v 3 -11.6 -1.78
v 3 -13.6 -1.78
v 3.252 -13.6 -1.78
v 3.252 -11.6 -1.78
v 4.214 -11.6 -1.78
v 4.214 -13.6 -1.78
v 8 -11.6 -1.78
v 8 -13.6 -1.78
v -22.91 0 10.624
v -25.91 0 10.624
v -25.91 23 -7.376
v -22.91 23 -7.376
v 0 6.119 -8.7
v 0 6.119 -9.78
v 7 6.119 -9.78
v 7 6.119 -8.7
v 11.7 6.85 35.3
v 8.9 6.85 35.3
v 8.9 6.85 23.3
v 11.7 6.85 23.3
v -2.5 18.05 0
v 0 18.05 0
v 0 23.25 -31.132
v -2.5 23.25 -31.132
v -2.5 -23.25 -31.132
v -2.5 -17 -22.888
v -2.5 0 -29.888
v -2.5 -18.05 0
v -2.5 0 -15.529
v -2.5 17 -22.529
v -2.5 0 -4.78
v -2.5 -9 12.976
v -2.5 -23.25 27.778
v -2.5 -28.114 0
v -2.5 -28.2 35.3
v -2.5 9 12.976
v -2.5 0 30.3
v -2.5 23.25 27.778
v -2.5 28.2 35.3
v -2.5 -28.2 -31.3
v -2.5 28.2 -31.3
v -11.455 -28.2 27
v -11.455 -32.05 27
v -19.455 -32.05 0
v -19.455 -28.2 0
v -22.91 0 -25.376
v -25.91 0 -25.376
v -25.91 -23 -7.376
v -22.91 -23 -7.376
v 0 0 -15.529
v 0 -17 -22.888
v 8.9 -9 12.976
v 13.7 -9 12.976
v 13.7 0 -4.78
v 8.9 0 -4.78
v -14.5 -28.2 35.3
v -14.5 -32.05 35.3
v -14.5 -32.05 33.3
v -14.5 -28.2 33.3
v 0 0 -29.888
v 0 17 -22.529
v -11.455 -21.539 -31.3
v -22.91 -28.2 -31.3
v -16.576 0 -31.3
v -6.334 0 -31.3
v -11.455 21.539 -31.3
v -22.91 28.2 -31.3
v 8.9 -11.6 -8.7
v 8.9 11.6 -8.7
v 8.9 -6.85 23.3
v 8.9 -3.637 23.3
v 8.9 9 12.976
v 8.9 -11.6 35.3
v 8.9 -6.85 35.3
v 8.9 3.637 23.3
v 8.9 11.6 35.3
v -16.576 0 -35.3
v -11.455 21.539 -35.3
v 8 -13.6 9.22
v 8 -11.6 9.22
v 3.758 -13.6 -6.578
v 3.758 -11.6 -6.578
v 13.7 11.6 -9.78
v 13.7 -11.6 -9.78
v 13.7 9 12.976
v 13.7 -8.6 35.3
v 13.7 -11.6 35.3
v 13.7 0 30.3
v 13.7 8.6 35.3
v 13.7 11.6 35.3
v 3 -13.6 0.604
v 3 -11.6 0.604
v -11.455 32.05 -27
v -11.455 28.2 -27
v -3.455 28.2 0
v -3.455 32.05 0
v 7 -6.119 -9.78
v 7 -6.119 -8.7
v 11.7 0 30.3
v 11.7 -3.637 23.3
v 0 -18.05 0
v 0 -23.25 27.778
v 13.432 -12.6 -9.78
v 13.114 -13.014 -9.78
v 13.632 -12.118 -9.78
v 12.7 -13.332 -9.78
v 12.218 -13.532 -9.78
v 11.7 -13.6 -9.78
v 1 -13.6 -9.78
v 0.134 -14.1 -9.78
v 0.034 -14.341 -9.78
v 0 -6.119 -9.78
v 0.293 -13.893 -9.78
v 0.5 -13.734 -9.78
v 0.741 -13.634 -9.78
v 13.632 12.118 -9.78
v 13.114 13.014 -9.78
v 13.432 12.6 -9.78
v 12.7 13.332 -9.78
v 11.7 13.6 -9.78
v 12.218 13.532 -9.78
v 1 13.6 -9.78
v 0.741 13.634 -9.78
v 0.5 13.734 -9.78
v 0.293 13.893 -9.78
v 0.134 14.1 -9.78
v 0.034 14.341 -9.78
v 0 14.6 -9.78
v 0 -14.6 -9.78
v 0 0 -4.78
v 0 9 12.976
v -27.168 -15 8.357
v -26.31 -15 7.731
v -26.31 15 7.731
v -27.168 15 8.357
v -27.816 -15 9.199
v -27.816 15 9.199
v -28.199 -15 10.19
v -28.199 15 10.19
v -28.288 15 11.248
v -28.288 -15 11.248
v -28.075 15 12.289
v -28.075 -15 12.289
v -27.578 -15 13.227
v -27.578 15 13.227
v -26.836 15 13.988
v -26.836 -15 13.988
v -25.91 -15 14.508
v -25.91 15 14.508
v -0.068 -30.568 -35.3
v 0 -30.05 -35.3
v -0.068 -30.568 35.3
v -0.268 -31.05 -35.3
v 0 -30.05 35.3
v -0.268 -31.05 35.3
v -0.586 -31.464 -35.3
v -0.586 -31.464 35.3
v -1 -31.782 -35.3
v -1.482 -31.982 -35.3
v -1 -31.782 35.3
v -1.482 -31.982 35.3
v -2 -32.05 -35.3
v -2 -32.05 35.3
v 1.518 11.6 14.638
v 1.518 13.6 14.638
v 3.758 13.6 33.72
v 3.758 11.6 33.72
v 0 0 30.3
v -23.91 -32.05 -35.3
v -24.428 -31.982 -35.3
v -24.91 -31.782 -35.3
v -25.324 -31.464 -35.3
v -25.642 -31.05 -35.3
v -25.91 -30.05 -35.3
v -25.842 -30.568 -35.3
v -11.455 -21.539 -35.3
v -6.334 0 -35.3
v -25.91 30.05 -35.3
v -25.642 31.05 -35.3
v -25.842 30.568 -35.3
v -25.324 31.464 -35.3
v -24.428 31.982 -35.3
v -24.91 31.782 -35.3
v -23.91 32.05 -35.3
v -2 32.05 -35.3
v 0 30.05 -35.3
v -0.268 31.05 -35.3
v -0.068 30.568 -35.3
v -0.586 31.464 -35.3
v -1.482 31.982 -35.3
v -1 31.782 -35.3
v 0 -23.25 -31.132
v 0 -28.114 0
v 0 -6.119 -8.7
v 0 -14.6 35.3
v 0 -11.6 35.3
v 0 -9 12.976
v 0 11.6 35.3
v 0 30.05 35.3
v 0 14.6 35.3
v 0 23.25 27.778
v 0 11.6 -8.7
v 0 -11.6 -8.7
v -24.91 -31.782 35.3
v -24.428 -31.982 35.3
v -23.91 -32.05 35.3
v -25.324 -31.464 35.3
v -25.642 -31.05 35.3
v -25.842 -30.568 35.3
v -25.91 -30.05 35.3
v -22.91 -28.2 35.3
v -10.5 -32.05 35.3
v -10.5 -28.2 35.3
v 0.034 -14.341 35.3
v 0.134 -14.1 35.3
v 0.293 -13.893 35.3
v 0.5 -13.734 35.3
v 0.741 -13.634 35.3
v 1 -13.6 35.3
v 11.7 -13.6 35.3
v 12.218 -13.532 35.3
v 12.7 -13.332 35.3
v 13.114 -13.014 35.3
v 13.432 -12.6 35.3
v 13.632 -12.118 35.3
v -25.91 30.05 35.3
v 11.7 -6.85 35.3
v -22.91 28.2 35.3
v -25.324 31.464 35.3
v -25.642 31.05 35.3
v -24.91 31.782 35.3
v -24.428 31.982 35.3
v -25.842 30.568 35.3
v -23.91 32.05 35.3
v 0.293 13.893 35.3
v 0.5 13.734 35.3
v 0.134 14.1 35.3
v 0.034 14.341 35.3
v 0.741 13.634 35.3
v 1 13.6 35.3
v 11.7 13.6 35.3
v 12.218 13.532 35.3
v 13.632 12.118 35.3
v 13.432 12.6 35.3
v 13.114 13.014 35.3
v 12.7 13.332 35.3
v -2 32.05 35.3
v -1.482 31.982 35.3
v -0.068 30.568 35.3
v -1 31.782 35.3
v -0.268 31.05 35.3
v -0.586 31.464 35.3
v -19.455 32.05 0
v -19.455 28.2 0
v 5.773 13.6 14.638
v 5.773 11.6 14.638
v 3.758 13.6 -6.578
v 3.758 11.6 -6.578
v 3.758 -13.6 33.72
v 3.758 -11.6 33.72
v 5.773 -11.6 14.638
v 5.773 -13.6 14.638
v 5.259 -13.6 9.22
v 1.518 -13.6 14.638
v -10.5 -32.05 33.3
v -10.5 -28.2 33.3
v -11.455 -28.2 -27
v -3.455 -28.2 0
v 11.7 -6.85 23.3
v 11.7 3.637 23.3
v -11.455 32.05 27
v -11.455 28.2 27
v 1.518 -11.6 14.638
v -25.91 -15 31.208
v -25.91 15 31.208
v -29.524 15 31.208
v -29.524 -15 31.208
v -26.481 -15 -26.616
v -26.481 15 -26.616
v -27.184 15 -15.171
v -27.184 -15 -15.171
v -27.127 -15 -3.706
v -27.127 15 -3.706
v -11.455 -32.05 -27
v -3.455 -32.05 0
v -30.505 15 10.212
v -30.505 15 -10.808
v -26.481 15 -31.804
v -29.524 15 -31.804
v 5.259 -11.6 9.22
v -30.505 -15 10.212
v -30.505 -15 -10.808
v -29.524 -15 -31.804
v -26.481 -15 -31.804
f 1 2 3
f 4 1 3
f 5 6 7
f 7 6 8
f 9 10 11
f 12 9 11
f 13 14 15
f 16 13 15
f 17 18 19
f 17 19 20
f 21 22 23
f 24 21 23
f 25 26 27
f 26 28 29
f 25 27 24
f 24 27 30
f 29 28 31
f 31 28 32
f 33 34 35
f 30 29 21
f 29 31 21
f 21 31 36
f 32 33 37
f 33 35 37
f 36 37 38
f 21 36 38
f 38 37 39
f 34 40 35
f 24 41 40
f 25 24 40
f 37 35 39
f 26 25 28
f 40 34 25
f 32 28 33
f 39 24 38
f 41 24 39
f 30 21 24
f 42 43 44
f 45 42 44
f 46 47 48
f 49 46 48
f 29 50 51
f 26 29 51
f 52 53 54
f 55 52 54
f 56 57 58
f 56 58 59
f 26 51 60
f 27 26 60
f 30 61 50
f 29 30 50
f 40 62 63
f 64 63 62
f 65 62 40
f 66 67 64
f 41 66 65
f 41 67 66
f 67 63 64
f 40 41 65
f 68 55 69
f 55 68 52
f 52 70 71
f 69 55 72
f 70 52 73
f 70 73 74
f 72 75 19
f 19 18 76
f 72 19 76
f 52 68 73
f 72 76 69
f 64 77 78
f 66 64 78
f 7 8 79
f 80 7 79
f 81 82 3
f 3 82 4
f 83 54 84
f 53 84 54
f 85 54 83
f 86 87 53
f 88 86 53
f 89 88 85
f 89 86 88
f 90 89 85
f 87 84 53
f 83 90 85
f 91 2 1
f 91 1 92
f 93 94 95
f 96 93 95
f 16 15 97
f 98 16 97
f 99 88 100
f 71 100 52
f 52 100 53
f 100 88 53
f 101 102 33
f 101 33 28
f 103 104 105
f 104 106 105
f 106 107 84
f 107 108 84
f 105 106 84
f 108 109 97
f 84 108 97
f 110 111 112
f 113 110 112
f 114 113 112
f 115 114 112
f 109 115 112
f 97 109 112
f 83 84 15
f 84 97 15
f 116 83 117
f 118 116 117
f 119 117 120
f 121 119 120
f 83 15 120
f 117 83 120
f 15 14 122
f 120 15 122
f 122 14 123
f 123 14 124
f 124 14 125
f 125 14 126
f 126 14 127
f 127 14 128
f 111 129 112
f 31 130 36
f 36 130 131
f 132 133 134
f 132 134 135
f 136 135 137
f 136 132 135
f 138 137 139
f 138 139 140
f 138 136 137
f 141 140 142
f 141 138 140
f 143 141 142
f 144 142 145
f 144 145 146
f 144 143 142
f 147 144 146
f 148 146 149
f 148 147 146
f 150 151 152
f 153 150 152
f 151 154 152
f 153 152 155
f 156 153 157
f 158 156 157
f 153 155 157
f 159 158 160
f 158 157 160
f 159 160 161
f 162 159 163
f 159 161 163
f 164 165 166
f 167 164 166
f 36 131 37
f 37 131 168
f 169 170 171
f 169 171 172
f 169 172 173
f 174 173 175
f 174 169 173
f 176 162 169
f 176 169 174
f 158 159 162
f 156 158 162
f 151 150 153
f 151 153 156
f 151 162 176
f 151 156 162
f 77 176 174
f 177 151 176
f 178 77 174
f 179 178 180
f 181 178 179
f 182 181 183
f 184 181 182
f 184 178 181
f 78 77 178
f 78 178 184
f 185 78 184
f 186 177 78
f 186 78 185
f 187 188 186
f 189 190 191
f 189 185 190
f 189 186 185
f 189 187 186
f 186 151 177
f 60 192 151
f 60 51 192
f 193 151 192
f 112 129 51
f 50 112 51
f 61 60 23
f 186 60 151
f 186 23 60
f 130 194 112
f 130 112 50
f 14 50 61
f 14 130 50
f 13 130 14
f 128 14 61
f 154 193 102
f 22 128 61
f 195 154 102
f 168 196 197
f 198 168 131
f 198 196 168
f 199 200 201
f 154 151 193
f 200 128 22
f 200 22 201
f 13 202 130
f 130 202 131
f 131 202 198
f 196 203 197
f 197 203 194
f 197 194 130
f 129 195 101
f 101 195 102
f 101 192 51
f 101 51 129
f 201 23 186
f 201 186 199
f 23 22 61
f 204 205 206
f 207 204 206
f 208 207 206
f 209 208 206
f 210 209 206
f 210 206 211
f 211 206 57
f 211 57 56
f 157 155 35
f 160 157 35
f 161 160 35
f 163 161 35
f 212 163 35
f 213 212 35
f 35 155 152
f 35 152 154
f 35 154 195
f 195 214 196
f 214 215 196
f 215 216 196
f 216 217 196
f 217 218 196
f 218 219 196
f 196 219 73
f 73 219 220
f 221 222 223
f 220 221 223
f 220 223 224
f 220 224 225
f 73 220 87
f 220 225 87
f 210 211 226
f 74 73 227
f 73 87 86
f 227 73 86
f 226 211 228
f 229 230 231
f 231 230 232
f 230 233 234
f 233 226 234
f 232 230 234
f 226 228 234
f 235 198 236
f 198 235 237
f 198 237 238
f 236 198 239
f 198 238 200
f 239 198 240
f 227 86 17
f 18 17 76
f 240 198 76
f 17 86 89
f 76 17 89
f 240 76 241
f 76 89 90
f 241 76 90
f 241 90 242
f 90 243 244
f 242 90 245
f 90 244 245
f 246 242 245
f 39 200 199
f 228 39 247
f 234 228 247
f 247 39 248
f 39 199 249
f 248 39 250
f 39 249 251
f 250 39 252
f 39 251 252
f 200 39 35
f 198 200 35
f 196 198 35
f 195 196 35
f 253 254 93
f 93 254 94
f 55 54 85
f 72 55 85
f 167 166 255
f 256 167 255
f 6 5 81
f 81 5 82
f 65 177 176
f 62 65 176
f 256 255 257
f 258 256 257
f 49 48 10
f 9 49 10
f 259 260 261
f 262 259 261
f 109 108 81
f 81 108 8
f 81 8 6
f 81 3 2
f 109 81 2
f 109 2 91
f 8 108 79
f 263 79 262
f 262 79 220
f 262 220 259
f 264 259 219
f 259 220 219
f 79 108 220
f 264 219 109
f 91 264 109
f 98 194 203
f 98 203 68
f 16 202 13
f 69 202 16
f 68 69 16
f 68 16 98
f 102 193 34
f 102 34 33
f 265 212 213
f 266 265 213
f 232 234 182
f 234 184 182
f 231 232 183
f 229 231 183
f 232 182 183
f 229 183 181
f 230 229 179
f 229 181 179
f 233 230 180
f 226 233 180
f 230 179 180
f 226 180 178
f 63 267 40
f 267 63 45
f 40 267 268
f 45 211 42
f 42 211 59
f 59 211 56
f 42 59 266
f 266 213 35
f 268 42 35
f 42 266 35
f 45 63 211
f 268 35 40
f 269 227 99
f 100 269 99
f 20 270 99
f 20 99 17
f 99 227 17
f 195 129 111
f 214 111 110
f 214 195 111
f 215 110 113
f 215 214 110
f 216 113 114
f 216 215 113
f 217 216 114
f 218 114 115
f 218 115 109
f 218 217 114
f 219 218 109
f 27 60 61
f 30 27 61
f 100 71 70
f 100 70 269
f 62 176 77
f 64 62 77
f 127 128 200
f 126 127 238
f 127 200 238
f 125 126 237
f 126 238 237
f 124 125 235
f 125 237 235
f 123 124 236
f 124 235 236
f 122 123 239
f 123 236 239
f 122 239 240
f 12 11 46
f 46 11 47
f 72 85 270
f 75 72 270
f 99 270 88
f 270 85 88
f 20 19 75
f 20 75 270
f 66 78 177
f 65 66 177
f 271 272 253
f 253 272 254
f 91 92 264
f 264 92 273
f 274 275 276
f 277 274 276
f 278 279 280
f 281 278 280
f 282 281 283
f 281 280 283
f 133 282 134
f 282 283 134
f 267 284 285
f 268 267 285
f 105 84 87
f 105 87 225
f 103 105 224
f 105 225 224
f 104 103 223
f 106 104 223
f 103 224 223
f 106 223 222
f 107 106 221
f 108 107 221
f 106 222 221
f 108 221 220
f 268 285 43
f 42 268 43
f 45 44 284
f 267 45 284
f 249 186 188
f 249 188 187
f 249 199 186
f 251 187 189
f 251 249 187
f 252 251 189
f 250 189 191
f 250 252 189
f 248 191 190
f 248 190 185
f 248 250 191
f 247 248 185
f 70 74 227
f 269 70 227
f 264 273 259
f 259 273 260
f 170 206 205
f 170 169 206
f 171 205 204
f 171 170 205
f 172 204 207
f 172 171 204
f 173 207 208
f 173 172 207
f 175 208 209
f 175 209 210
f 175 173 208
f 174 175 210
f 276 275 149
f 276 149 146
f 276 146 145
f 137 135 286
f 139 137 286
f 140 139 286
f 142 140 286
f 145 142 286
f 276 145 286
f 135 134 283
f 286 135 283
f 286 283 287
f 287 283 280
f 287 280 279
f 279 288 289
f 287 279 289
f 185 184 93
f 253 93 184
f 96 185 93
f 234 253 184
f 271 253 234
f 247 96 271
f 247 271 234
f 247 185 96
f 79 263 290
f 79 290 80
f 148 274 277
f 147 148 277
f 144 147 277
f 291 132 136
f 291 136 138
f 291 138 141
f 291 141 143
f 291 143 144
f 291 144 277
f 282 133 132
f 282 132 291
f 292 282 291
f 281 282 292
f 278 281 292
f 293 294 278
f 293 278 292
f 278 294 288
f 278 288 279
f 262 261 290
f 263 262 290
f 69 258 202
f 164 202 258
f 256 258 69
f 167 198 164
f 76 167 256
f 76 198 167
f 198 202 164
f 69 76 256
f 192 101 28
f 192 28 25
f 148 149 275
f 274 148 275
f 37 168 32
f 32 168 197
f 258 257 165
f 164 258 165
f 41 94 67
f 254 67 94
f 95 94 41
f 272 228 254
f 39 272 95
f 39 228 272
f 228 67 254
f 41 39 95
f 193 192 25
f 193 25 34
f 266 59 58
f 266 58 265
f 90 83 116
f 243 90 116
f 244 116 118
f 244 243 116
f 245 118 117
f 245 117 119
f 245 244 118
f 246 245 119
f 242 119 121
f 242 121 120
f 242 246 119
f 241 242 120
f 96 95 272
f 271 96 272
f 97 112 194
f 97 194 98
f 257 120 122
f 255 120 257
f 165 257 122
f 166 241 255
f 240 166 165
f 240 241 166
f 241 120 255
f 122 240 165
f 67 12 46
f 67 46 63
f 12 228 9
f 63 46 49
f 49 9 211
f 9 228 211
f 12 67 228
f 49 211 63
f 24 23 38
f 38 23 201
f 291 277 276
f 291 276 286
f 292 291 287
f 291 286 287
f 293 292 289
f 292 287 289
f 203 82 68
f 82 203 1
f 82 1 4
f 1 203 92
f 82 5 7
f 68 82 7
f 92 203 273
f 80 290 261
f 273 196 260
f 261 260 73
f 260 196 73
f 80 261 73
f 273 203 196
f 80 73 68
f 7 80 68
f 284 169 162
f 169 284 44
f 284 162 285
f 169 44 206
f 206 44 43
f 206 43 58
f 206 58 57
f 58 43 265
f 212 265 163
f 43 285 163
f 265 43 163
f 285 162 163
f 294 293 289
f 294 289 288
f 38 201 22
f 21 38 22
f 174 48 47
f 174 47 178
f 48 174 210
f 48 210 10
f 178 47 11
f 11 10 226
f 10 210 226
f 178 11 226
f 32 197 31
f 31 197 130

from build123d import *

# Parameters (mm, degrees)
SKETCH2_W                 = 64.1
SKETCH2_H                 = 70.6
BOSS_EXTRUDE1_DEPTH       = 22.91
SKETCH4_W                 = 21.2
SKETCH4_H                 = 56.4
CUT_EXTRUDE2_DEPTH        = 66.6
SKETCH5_W                 = 27.2
SKETCH5_H                 = 37
BOSS_EXTRUDE2_DEPTH       = 11.7
SKETCH7_W                 = 11.7
SKETCH7_H                 = 27.2
BOSS_EXTRUDE3_DEPTH       = 8.08
SKETCH6_W                 = 8.9
SKETCH6_H                 = 23.2
CUT_EXTRUDE3_DEPTH        = 44
SKETCH8_W                 = 12.2
SKETCH8_H                 = 13.7
CUT_EXTRUDE4_DEPTH        = 12
CUT_EXTRUDE5_REACH        = 64.088
SKETCH10_W                = 27.2
SKETCH10_H                = 45.08
BOSS_EXTRUDE4_DEPTH       = 2
SKETCH11_W                = 5
SKETCH11_H                = 11
CUT_EXTRUDE6_DEPTH        = 2
BOSS_EXTRUDE5_DEPTH       = 27.2
CUT_EXTRUDE8_REACH        = 84.64
SKETCH14_W                = 14.896508991
SKETCH14_H                = 5
SKETCH15_R                = 3.5
CUT_EXTRUDE9_DEPTH        = 5
THREAD2_PITCH             = 1.5
THREAD2_HEIGHT            = 10
THREAD2_RADIUS            = 3.5
THREAD2_START_ANGLE       = -180
CUT_EXTRUDE13_REACH       = 80.566
CUT_EXTRUDE14_REACH       = 62.113
SKETCH41_W                = 7
SKETCH41_H                = 12.238058432
CUT_EXTRUDE15_DEPTH       = 1.08
CUT_EXTRUDE16_DEPTH       = 4
SKETCH44_W                = 4
SKETCH44_H                = 3.85
CUT_EXTRUDE17_DEPTH       = 2
FILLET1_R                 = 2
SKETCH45_W                = 37.09673571
SKETCH45_H                = 46.917342367
CUT_EXTRUDE18_DEPTH       = 17.2
SKETCH46_W                = 64.1
SKETCH46_H                = 70.6
BOSS_EXTRUDE6_DEPTH       = 5
SKETCH48_W                = 70.6
SKETCH48_H                = 64.1
BOSS_EXTRUDE7_DEPTH       = 5
CUT_EXTRUDE19_DEPTH       = 3.5
CUT_EXTRUDE19_DEPTH_BACK  = 4
CHAMFER1_SIZE             = 0.2
SKETCH53_W                = 8.871125199
SKETCH53_H                = 9.434371244
BOSS_EXTRUDE8_DEPTH       = 10
SKETCH54_W                = 7
SKETCH54_H                = 64.1
CUT_EXTRUDE20_DEPTH       = 70.6
FILLET2_R                 = 2
FILLET3_R                 = 1
BOSS_EXTRUDE10_DEPTH      = 15
BOSS_EXTRUDE10_DEPTH_BACK = 15
CUT_EXTRUDE21_DEPTH       = 30
CUT_EXTRUDE22_DEPTH       = 3
CUT_EXTRUDE23_DEPTH       = 2.5
CUT_EXTRUDE24_DEPTH       = 2.5
CUT_EXTRUDE25_DEPTH       = 30


with BuildPart() as part:
    # Sketch2 → Boss-Extrude1 (new body)
    with BuildSketch(Plane.YZ):
        Rectangle(SKETCH2_W, SKETCH2_H)
    extrude(amount=-BOSS_EXTRUDE1_DEPTH)

    # Sketch4 → Cut-Extrude2 (cut)
    with BuildSketch(Plane.XY.offset(35.3)):
        with Locations((-13.1, 0)):
            Rectangle(SKETCH4_W, SKETCH4_H)
    extrude(amount=-CUT_EXTRUDE2_DEPTH, mode=Mode.SUBTRACT)

    # Sketch5 → Boss-Extrude2 (add)
    with BuildSketch(Plane.YZ):
        with Locations((0, 16.8)):
            Rectangle(SKETCH5_W, SKETCH5_H)
    extrude(amount=BOSS_EXTRUDE2_DEPTH)

    # Sketch7 → Boss-Extrude3 (add)
    with BuildSketch(Plane(origin=(0, 0, -1.7), x_dir=(1, 0, 0), z_dir=(0, 0, -1))):
        with Locations((5.85, 0)):
            Rectangle(SKETCH7_W, SKETCH7_H)
    extrude(amount=BOSS_EXTRUDE3_DEPTH)

    # Sketch6 → Cut-Extrude3 (cut)
    with BuildSketch(Plane.XY.offset(35.3)):
        with Locations((4.45, 0)):
            Rectangle(SKETCH6_W, SKETCH6_H)
    extrude(amount=-CUT_EXTRUDE3_DEPTH, mode=Mode.SUBTRACT)

    # Sketch8 → Cut-Extrude4 (cut)
    with BuildSketch(Plane.XY.offset(35.3)):
        with Locations((6.1, 0)):
            Rectangle(SKETCH8_W, SKETCH8_H)
    extrude(amount=-CUT_EXTRUDE4_DEPTH, mode=Mode.SUBTRACT)

    # Cut-Extrude5: up to this face of the body (flat: up to its plane)
    cut_extrude5_end = Plane(part.part.faces().sort_by_distance((5.85, -13.6, 12.76))[0])
    # Sketch9 → Cut-Extrude5 (cut, up to the picked face)
    with BuildSketch(Plane(origin=(0, 13.6, 0), x_dir=(-1, 0, 0), z_dir=(0, 1, 0)), mode=Mode.PRIVATE) as cut_extrude5_sk1:
        Polygon((-3.758381781, 33.720026795), (-5.773286722, 14.637691772), (-3.758381781, -6.578072011), (-1.518207966, 14.637691772), align=None)
    cut_extrude5_tool1 = split(extrude(cut_extrude5_sk1.sketch, amount=-CUT_EXTRUDE5_REACH, mode=Mode.PRIVATE), bisect_by=cut_extrude5_end, keep=Keep.BOTH, mode=Mode.PRIVATE)
    add(cut_extrude5_tool1.solids().sort_by(Axis((3.683292, 13.6, 13.926549), (0, -1, 0)))[0], mode=Mode.SUBTRACT)

    # Sketch10 → Boss-Extrude4 (add)
    with BuildSketch(Plane.YZ.offset(11.7)):
        with Locations((0, 12.76)):
            Rectangle(SKETCH10_W, SKETCH10_H)
    extrude(amount=BOSS_EXTRUDE4_DEPTH)

    # Sketch11 → Cut-Extrude6 (cut)
    with BuildSketch(Plane.XZ.offset(13.6)):
        with Locations((5.5, 3.72)):
            Rectangle(SKETCH11_W, SKETCH11_H)
    extrude(amount=-CUT_EXTRUDE6_DEPTH, mode=Mode.SUBTRACT)

    # Sketch12 → Boss-Extrude5 (add)
    with BuildSketch(Plane.XZ.offset(13.6)):
        Polygon((13.7, 35.3), (28.596508991, 35.3), (28.596508991, -0.612717465), (23.596508991, -0.612717465), (23.596508991, 26.766284959), (17.316508991, 26.766284959), (13.7, 26.766284959), align=None)
    extrude(amount=-BOSS_EXTRUDE5_DEPTH)

    # Cut-Extrude8: up to this face of the body (flat: up to its plane)
    cut_extrude8_end = Plane(part.part.faces().sort_by_distance((26.096508991, 0, -0.612717465))[0])
    # Sketch14 → Cut-Extrude8 (cut, up to the picked face)
    with BuildSketch(Plane.XY.offset(35.3), mode=Mode.PRIVATE) as cut_extrude8_sk1:
        with Locations((21.148254496, -11.1)):
            Rectangle(SKETCH14_W, SKETCH14_H)
    cut_extrude8_tool1 = split(extrude(cut_extrude8_sk1.sketch, amount=-CUT_EXTRUDE8_REACH, mode=Mode.PRIVATE), bisect_by=cut_extrude8_end, keep=Keep.BOTH, mode=Mode.PRIVATE)
    # Sketch14 → Cut-Extrude8 (cut, up to the picked face)
    with BuildSketch(Plane.XY.offset(35.3), mode=Mode.PRIVATE) as cut_extrude8_sk2:
        with Locations((21.148254496, 11.1)):
            Rectangle(SKETCH14_W, SKETCH14_H)
    cut_extrude8_tool2 = split(extrude(cut_extrude8_sk2.sketch, amount=-CUT_EXTRUDE8_REACH, mode=Mode.PRIVATE), bisect_by=cut_extrude8_end, keep=Keep.BOTH, mode=Mode.PRIVATE)
    add(cut_extrude8_tool1.solids().sort_by(Axis((21.148254, -11.1, 35.3), (0, 0, -1)))[0], mode=Mode.SUBTRACT)
    add(cut_extrude8_tool2.solids().sort_by(Axis((21.148254, 11.1, 35.3), (0, 0, -1)))[0], mode=Mode.SUBTRACT)

    # Sketch15 → Cut-Extrude9 (cut)
    with BuildSketch(Plane.YZ.offset(28.596508991)):
        with Locations(Location((0, 18.430454013, 0), (0, 0, 270))):
            Circle(SKETCH15_R)
    extrude(amount=-CUT_EXTRUDE9_DEPTH, mode=Mode.SUBTRACT)

    # Thread2: sweep along a helix
    with BuildLine() as thread2_path:
        add(Helix(THREAD2_PITCH, THREAD2_HEIGHT, THREAD2_RADIUS, center=(29.596508991, 0, 18.430454013), direction=(-1, 0, 0), lefthand=True, mode=Mode.PRIVATE).rotate(Axis((29.596508991, 0, 18.430454013), (-1, 0, 0)), THREAD2_START_ANGLE))
    # Thread Profile3 → Thread2 (sweep, cut)
    with BuildSketch(Plane(origin=(29.596508991, 0, 21.930454013), x_dir=(0, 0, 1), z_dir=(0, -1, 0))):
        Polygon((0, 0), (0.811898813, 0.468749998), (0.811898813, 0.656249998), (0, 1.124999996), align=None)
    sweep(path=thread2_path.line, is_frenet=True, mode=Mode.SUBTRACT)

    # Cut-Extrude13: up to this face of the body (flat: up to its plane)
    cut_extrude13_end = Plane(part.part.faces().sort_by_distance((-11.455, 32.05, 0))[0])
    # Sketch39 → Cut-Extrude13 (cut, up to the picked face)
    with BuildSketch(Plane.XZ.offset(32.05), mode=Mode.PRIVATE) as cut_extrude13_sk1:
        Polygon((-11.455, 27), (-19.455, 0), (-11.455, -27), (-3.455, 0), align=None)
    cut_extrude13_tool1 = split(extrude(cut_extrude13_sk1.sketch, amount=-CUT_EXTRUDE13_REACH, mode=Mode.PRIVATE), bisect_by=cut_extrude13_end, keep=Keep.BOTH, mode=Mode.PRIVATE)
    add(cut_extrude13_tool1.solids().sort_by(Axis((-11.455, -32.05, 0), (0, 1, 0)))[0], mode=Mode.SUBTRACT)

    # Cut-Extrude14: up to this face of the body (flat: up to its plane)
    cut_extrude14_end = Plane(part.part.faces().sort_by_distance((8.9, 0, 10.228538066))[0])
    # Sketch40 → Cut-Extrude14 (cut, up to the picked face)
    with BuildSketch(Plane.YZ.offset(13.7), mode=Mode.PRIVATE) as cut_extrude14_sk1:
        Polygon((0, -4.78), (9, 12.976283311), (0, 30.3), (-9, 12.976283311), align=None)
    cut_extrude14_tool1 = split(extrude(cut_extrude14_sk1.sketch, amount=-CUT_EXTRUDE14_REACH, mode=Mode.PRIVATE), bisect_by=cut_extrude14_end, keep=Keep.BOTH, mode=Mode.PRIVATE)
    add(cut_extrude14_tool1.solids().sort_by(Axis((13.7, 0, 12.832094), (-1, 0, 0)))[0], mode=Mode.SUBTRACT)

    # Sketch41 → Cut-Extrude15 (cut)
    with BuildSketch(Plane(origin=(0, 0, -9.78), x_dir=(1, 0, 0), z_dir=(0, 0, -1))):
        with Locations((3.5, 0)):
            Rectangle(SKETCH41_W, SKETCH41_H)
    extrude(amount=-CUT_EXTRUDE15_DEPTH, mode=Mode.SUBTRACT)

    # Sketch42 → Cut-Extrude16 (cut)
    with BuildSketch(Plane(origin=(0, 0, -35.3), x_dir=(1, 0, 0), z_dir=(0, 0, -1))):
        Polygon((-11.455, 21.539378486), (-16.575689674, 0), (-11.455, -21.539378486), (-6.334310326, 0), align=None)
    extrude(amount=-CUT_EXTRUDE16_DEPTH, mode=Mode.SUBTRACT)

    # Sketch44 → Cut-Extrude17 (cut)
    with BuildSketch(Plane.XY.offset(35.3)):
        with Locations((-12.5, -30.125)):
            Rectangle(SKETCH44_W, SKETCH44_H)
    extrude(amount=-CUT_EXTRUDE17_DEPTH, mode=Mode.SUBTRACT)

    # Fillet1
    fillet1_edges = [part.edges().sort_by_distance(p)[0] for p in [
        (13.7, 13.6, 12.76),
        (13.7, -13.6, 12.76),
        (0, -32.05, 0),
        (0, 32.05, 0),
    ]]
    fillet(fillet1_edges, radius=FILLET1_R)

    # Sketch45 → Cut-Extrude18 (cut)
    with BuildSketch(Plane.XZ.offset(8.6)):
        with Locations((32.248367855, 11.841328817)):
            Rectangle(SKETCH45_W, SKETCH45_H)
    extrude(amount=-CUT_EXTRUDE18_DEPTH, mode=Mode.SUBTRACT)

    # Sketch46 → Boss-Extrude6 (add)
    with BuildSketch(Plane(origin=(-22.91, 0, 0), x_dir=(0, -1, 0), z_dir=(-1, 0, 0))):
        Rectangle(SKETCH46_W, SKETCH46_H)
    extrude(amount=BOSS_EXTRUDE6_DEPTH)

    # Sketch48 → Boss-Extrude7 (add)
    with BuildSketch(Plane.ZY.offset(27.91)):
        Rectangle(SKETCH48_W, SKETCH48_H)
    extrude(amount=BOSS_EXTRUDE7_DEPTH)

    # Sketch52 → Cut-Extrude19 (cut, two sides: drawn at the far end of the back side and taken through both)
    with BuildSketch(Plane.XY.offset(25.3).offset(-CUT_EXTRUDE19_DEPTH_BACK)):
        with BuildLine():
            Line((-32.91, -2.5), (-32.41, -2.5))
            ThreePointArc((-32.41, -2.5), (-29.904288208, -3.5), (-27.431598813, -2.420926907))
            ThreePointArc((-27.431598813, -2.420926907), (-26.459438058, 0), (-27.431598813, 2.420926907))
            ThreePointArc((-27.431598813, 2.420926907), (-29.904288208, 3.5), (-32.41, 2.5))
            Line((-32.41, 2.5), (-32.91, 2.5))
            Line((-32.91, 2.5), (-32.91, -2.5))
        make_face()
    extrude(amount=CUT_EXTRUDE19_DEPTH + CUT_EXTRUDE19_DEPTH_BACK, mode=Mode.SUBTRACT)

    # Chamfer1
    chamfer1_edges = [part.edges().sort_by_distance(p)[0] for p in [
        (-32.91, 2.5, 25.05),
        (-32.91, -2.5, 25.05),
    ]]
    chamfer(chamfer1_edges, length=CHAMFER1_SIZE)

    # Sketch53 → Boss-Extrude8 (add)
    with BuildSketch(Plane(origin=(-32.91, 0, 0), x_dir=(0, -1, 0), z_dir=(-1, 0, 0))):
        with Locations((0.211217266, 24.67721732)):
            Rectangle(SKETCH53_W, SKETCH53_H)
    extrude(amount=-BOSS_EXTRUDE8_DEPTH)

    # Sketch54 → Cut-Extrude20 (cut)
    with BuildSketch(Plane.XY.offset(35.3)):
        with Locations((-29.41, 0)):
            Rectangle(SKETCH54_W, SKETCH54_H)
    extrude(amount=-CUT_EXTRUDE20_DEPTH, mode=Mode.SUBTRACT)

    # Fillet2
    fillet2_edges = [part.edges().sort_by_distance(p)[0] for p in [
        (-25.91, -32.05, 0),
        (-25.91, 32.05, 0),
    ]]
    fillet(fillet2_edges, radius=FILLET2_R)

    # Fillet3
    fillet3_edges = [part.edges().sort_by_distance(p)[0] for p in [
        (0, -13.6, 12.76),
        (0, 13.6, 12.76),
    ]]
    fillet(fillet3_edges, radius=FILLET3_R)

    # Sketch58 → Cut-Extrude22 (cut)
    with BuildSketch(Plane(origin=(-25.91, 0, 0), x_dir=(0, -1, 0), z_dir=(-1, 0, 0))):
        Polygon((0, 10.623546293), (-23, -7.376453707), (0, -25.376453707), (23, -7.376453707), align=None)
    extrude(amount=-CUT_EXTRUDE22_DEPTH, mode=Mode.SUBTRACT)

    # Sketch59 → Cut-Extrude23 (cut)
    with BuildSketch(Plane.YZ):
        Polygon((0, 30.3), (-9, 12.976283311), (0, -4.78), (9, 12.976283311), align=None)
    extrude(amount=-CUT_EXTRUDE23_DEPTH, mode=Mode.SUBTRACT)

    # Sketch60 → Cut-Extrude24 (cut)
    with BuildSketch(Plane.YZ):
        Polygon((23.25, 27.778073653), (18.050221383, 0), (23.25, -31.131856824), (23.25, 0), align=None)
        Polygon((-23.25, -31.131856824), (-28.113974033, 0), (-23.25, 27.778073653), (-18.050221383, 0), align=None)
        Polygon((0, -15.529474247), (-17, -22.887792456), (0, -29.887792456), (17, -22.529474247), align=None)
    extrude(amount=-CUT_EXTRUDE24_DEPTH, mode=Mode.SUBTRACT)


with BuildPart() as body_2:
    # Sketch55 → Boss-Extrude10 (new, two sides: drawn at the far end of the back side and taken through both)
    with BuildSketch(Plane(origin=(0, 0, 0), x_dir=(-1, 0, 0), z_dir=(0, -1, 0)).offset(-BOSS_EXTRUDE10_DEPTH_BACK)):
        with BuildLine():
            Line((25.91, -31.208220078), (29.523727835, -31.208220078))
            ThreePointArc((29.523727835, -31.208220078), (30.62755681, 0.297981597), (29.523727835, 31.804183271))
            Line((29.523727835, 31.804183271), (25.91, 31.804183271))
            ThreePointArc((25.91, 31.804183271), (27.252769522, 10.297981597), (25.91, -11.208220078))
            Line((25.91, -11.208220078), (25.91, -31.208220078))
        make_face()
    extrude(amount=BOSS_EXTRUDE10_DEPTH + BOSS_EXTRUDE10_DEPTH_BACK)

    # Sketch56 → Cut-Extrude21 (cut)
    with BuildSketch(Plane.XZ.offset(15)):
        with BuildLine():
            Line((-25.91, 14.508220078), (-25.91, 11.208220078))
            Line((-25.91, 11.208220078), (-26.310184517, 7.731173579))
            ThreePointArc((-26.310184517, 7.731173579), (-28.288197672, 11.248313928), (-25.91, 14.508220078))
        make_face()
    extrude(amount=-CUT_EXTRUDE21_DEPTH, mode=Mode.SUBTRACT)

    # Sketch61 → Cut-Extrude25 (cut)
    with BuildSketch(Plane.XZ.offset(15)):
        Polygon((-26.481028174, -31.804183271), (-26.481028174, -26.615666757), (-25.91, -27.108643608), (-25.91, -34.058493615), align=None)
    extrude(amount=-CUT_EXTRUDE25_DEPTH, mode=Mode.SUBTRACT)


solid = Compound([part.part, body_2.part])
